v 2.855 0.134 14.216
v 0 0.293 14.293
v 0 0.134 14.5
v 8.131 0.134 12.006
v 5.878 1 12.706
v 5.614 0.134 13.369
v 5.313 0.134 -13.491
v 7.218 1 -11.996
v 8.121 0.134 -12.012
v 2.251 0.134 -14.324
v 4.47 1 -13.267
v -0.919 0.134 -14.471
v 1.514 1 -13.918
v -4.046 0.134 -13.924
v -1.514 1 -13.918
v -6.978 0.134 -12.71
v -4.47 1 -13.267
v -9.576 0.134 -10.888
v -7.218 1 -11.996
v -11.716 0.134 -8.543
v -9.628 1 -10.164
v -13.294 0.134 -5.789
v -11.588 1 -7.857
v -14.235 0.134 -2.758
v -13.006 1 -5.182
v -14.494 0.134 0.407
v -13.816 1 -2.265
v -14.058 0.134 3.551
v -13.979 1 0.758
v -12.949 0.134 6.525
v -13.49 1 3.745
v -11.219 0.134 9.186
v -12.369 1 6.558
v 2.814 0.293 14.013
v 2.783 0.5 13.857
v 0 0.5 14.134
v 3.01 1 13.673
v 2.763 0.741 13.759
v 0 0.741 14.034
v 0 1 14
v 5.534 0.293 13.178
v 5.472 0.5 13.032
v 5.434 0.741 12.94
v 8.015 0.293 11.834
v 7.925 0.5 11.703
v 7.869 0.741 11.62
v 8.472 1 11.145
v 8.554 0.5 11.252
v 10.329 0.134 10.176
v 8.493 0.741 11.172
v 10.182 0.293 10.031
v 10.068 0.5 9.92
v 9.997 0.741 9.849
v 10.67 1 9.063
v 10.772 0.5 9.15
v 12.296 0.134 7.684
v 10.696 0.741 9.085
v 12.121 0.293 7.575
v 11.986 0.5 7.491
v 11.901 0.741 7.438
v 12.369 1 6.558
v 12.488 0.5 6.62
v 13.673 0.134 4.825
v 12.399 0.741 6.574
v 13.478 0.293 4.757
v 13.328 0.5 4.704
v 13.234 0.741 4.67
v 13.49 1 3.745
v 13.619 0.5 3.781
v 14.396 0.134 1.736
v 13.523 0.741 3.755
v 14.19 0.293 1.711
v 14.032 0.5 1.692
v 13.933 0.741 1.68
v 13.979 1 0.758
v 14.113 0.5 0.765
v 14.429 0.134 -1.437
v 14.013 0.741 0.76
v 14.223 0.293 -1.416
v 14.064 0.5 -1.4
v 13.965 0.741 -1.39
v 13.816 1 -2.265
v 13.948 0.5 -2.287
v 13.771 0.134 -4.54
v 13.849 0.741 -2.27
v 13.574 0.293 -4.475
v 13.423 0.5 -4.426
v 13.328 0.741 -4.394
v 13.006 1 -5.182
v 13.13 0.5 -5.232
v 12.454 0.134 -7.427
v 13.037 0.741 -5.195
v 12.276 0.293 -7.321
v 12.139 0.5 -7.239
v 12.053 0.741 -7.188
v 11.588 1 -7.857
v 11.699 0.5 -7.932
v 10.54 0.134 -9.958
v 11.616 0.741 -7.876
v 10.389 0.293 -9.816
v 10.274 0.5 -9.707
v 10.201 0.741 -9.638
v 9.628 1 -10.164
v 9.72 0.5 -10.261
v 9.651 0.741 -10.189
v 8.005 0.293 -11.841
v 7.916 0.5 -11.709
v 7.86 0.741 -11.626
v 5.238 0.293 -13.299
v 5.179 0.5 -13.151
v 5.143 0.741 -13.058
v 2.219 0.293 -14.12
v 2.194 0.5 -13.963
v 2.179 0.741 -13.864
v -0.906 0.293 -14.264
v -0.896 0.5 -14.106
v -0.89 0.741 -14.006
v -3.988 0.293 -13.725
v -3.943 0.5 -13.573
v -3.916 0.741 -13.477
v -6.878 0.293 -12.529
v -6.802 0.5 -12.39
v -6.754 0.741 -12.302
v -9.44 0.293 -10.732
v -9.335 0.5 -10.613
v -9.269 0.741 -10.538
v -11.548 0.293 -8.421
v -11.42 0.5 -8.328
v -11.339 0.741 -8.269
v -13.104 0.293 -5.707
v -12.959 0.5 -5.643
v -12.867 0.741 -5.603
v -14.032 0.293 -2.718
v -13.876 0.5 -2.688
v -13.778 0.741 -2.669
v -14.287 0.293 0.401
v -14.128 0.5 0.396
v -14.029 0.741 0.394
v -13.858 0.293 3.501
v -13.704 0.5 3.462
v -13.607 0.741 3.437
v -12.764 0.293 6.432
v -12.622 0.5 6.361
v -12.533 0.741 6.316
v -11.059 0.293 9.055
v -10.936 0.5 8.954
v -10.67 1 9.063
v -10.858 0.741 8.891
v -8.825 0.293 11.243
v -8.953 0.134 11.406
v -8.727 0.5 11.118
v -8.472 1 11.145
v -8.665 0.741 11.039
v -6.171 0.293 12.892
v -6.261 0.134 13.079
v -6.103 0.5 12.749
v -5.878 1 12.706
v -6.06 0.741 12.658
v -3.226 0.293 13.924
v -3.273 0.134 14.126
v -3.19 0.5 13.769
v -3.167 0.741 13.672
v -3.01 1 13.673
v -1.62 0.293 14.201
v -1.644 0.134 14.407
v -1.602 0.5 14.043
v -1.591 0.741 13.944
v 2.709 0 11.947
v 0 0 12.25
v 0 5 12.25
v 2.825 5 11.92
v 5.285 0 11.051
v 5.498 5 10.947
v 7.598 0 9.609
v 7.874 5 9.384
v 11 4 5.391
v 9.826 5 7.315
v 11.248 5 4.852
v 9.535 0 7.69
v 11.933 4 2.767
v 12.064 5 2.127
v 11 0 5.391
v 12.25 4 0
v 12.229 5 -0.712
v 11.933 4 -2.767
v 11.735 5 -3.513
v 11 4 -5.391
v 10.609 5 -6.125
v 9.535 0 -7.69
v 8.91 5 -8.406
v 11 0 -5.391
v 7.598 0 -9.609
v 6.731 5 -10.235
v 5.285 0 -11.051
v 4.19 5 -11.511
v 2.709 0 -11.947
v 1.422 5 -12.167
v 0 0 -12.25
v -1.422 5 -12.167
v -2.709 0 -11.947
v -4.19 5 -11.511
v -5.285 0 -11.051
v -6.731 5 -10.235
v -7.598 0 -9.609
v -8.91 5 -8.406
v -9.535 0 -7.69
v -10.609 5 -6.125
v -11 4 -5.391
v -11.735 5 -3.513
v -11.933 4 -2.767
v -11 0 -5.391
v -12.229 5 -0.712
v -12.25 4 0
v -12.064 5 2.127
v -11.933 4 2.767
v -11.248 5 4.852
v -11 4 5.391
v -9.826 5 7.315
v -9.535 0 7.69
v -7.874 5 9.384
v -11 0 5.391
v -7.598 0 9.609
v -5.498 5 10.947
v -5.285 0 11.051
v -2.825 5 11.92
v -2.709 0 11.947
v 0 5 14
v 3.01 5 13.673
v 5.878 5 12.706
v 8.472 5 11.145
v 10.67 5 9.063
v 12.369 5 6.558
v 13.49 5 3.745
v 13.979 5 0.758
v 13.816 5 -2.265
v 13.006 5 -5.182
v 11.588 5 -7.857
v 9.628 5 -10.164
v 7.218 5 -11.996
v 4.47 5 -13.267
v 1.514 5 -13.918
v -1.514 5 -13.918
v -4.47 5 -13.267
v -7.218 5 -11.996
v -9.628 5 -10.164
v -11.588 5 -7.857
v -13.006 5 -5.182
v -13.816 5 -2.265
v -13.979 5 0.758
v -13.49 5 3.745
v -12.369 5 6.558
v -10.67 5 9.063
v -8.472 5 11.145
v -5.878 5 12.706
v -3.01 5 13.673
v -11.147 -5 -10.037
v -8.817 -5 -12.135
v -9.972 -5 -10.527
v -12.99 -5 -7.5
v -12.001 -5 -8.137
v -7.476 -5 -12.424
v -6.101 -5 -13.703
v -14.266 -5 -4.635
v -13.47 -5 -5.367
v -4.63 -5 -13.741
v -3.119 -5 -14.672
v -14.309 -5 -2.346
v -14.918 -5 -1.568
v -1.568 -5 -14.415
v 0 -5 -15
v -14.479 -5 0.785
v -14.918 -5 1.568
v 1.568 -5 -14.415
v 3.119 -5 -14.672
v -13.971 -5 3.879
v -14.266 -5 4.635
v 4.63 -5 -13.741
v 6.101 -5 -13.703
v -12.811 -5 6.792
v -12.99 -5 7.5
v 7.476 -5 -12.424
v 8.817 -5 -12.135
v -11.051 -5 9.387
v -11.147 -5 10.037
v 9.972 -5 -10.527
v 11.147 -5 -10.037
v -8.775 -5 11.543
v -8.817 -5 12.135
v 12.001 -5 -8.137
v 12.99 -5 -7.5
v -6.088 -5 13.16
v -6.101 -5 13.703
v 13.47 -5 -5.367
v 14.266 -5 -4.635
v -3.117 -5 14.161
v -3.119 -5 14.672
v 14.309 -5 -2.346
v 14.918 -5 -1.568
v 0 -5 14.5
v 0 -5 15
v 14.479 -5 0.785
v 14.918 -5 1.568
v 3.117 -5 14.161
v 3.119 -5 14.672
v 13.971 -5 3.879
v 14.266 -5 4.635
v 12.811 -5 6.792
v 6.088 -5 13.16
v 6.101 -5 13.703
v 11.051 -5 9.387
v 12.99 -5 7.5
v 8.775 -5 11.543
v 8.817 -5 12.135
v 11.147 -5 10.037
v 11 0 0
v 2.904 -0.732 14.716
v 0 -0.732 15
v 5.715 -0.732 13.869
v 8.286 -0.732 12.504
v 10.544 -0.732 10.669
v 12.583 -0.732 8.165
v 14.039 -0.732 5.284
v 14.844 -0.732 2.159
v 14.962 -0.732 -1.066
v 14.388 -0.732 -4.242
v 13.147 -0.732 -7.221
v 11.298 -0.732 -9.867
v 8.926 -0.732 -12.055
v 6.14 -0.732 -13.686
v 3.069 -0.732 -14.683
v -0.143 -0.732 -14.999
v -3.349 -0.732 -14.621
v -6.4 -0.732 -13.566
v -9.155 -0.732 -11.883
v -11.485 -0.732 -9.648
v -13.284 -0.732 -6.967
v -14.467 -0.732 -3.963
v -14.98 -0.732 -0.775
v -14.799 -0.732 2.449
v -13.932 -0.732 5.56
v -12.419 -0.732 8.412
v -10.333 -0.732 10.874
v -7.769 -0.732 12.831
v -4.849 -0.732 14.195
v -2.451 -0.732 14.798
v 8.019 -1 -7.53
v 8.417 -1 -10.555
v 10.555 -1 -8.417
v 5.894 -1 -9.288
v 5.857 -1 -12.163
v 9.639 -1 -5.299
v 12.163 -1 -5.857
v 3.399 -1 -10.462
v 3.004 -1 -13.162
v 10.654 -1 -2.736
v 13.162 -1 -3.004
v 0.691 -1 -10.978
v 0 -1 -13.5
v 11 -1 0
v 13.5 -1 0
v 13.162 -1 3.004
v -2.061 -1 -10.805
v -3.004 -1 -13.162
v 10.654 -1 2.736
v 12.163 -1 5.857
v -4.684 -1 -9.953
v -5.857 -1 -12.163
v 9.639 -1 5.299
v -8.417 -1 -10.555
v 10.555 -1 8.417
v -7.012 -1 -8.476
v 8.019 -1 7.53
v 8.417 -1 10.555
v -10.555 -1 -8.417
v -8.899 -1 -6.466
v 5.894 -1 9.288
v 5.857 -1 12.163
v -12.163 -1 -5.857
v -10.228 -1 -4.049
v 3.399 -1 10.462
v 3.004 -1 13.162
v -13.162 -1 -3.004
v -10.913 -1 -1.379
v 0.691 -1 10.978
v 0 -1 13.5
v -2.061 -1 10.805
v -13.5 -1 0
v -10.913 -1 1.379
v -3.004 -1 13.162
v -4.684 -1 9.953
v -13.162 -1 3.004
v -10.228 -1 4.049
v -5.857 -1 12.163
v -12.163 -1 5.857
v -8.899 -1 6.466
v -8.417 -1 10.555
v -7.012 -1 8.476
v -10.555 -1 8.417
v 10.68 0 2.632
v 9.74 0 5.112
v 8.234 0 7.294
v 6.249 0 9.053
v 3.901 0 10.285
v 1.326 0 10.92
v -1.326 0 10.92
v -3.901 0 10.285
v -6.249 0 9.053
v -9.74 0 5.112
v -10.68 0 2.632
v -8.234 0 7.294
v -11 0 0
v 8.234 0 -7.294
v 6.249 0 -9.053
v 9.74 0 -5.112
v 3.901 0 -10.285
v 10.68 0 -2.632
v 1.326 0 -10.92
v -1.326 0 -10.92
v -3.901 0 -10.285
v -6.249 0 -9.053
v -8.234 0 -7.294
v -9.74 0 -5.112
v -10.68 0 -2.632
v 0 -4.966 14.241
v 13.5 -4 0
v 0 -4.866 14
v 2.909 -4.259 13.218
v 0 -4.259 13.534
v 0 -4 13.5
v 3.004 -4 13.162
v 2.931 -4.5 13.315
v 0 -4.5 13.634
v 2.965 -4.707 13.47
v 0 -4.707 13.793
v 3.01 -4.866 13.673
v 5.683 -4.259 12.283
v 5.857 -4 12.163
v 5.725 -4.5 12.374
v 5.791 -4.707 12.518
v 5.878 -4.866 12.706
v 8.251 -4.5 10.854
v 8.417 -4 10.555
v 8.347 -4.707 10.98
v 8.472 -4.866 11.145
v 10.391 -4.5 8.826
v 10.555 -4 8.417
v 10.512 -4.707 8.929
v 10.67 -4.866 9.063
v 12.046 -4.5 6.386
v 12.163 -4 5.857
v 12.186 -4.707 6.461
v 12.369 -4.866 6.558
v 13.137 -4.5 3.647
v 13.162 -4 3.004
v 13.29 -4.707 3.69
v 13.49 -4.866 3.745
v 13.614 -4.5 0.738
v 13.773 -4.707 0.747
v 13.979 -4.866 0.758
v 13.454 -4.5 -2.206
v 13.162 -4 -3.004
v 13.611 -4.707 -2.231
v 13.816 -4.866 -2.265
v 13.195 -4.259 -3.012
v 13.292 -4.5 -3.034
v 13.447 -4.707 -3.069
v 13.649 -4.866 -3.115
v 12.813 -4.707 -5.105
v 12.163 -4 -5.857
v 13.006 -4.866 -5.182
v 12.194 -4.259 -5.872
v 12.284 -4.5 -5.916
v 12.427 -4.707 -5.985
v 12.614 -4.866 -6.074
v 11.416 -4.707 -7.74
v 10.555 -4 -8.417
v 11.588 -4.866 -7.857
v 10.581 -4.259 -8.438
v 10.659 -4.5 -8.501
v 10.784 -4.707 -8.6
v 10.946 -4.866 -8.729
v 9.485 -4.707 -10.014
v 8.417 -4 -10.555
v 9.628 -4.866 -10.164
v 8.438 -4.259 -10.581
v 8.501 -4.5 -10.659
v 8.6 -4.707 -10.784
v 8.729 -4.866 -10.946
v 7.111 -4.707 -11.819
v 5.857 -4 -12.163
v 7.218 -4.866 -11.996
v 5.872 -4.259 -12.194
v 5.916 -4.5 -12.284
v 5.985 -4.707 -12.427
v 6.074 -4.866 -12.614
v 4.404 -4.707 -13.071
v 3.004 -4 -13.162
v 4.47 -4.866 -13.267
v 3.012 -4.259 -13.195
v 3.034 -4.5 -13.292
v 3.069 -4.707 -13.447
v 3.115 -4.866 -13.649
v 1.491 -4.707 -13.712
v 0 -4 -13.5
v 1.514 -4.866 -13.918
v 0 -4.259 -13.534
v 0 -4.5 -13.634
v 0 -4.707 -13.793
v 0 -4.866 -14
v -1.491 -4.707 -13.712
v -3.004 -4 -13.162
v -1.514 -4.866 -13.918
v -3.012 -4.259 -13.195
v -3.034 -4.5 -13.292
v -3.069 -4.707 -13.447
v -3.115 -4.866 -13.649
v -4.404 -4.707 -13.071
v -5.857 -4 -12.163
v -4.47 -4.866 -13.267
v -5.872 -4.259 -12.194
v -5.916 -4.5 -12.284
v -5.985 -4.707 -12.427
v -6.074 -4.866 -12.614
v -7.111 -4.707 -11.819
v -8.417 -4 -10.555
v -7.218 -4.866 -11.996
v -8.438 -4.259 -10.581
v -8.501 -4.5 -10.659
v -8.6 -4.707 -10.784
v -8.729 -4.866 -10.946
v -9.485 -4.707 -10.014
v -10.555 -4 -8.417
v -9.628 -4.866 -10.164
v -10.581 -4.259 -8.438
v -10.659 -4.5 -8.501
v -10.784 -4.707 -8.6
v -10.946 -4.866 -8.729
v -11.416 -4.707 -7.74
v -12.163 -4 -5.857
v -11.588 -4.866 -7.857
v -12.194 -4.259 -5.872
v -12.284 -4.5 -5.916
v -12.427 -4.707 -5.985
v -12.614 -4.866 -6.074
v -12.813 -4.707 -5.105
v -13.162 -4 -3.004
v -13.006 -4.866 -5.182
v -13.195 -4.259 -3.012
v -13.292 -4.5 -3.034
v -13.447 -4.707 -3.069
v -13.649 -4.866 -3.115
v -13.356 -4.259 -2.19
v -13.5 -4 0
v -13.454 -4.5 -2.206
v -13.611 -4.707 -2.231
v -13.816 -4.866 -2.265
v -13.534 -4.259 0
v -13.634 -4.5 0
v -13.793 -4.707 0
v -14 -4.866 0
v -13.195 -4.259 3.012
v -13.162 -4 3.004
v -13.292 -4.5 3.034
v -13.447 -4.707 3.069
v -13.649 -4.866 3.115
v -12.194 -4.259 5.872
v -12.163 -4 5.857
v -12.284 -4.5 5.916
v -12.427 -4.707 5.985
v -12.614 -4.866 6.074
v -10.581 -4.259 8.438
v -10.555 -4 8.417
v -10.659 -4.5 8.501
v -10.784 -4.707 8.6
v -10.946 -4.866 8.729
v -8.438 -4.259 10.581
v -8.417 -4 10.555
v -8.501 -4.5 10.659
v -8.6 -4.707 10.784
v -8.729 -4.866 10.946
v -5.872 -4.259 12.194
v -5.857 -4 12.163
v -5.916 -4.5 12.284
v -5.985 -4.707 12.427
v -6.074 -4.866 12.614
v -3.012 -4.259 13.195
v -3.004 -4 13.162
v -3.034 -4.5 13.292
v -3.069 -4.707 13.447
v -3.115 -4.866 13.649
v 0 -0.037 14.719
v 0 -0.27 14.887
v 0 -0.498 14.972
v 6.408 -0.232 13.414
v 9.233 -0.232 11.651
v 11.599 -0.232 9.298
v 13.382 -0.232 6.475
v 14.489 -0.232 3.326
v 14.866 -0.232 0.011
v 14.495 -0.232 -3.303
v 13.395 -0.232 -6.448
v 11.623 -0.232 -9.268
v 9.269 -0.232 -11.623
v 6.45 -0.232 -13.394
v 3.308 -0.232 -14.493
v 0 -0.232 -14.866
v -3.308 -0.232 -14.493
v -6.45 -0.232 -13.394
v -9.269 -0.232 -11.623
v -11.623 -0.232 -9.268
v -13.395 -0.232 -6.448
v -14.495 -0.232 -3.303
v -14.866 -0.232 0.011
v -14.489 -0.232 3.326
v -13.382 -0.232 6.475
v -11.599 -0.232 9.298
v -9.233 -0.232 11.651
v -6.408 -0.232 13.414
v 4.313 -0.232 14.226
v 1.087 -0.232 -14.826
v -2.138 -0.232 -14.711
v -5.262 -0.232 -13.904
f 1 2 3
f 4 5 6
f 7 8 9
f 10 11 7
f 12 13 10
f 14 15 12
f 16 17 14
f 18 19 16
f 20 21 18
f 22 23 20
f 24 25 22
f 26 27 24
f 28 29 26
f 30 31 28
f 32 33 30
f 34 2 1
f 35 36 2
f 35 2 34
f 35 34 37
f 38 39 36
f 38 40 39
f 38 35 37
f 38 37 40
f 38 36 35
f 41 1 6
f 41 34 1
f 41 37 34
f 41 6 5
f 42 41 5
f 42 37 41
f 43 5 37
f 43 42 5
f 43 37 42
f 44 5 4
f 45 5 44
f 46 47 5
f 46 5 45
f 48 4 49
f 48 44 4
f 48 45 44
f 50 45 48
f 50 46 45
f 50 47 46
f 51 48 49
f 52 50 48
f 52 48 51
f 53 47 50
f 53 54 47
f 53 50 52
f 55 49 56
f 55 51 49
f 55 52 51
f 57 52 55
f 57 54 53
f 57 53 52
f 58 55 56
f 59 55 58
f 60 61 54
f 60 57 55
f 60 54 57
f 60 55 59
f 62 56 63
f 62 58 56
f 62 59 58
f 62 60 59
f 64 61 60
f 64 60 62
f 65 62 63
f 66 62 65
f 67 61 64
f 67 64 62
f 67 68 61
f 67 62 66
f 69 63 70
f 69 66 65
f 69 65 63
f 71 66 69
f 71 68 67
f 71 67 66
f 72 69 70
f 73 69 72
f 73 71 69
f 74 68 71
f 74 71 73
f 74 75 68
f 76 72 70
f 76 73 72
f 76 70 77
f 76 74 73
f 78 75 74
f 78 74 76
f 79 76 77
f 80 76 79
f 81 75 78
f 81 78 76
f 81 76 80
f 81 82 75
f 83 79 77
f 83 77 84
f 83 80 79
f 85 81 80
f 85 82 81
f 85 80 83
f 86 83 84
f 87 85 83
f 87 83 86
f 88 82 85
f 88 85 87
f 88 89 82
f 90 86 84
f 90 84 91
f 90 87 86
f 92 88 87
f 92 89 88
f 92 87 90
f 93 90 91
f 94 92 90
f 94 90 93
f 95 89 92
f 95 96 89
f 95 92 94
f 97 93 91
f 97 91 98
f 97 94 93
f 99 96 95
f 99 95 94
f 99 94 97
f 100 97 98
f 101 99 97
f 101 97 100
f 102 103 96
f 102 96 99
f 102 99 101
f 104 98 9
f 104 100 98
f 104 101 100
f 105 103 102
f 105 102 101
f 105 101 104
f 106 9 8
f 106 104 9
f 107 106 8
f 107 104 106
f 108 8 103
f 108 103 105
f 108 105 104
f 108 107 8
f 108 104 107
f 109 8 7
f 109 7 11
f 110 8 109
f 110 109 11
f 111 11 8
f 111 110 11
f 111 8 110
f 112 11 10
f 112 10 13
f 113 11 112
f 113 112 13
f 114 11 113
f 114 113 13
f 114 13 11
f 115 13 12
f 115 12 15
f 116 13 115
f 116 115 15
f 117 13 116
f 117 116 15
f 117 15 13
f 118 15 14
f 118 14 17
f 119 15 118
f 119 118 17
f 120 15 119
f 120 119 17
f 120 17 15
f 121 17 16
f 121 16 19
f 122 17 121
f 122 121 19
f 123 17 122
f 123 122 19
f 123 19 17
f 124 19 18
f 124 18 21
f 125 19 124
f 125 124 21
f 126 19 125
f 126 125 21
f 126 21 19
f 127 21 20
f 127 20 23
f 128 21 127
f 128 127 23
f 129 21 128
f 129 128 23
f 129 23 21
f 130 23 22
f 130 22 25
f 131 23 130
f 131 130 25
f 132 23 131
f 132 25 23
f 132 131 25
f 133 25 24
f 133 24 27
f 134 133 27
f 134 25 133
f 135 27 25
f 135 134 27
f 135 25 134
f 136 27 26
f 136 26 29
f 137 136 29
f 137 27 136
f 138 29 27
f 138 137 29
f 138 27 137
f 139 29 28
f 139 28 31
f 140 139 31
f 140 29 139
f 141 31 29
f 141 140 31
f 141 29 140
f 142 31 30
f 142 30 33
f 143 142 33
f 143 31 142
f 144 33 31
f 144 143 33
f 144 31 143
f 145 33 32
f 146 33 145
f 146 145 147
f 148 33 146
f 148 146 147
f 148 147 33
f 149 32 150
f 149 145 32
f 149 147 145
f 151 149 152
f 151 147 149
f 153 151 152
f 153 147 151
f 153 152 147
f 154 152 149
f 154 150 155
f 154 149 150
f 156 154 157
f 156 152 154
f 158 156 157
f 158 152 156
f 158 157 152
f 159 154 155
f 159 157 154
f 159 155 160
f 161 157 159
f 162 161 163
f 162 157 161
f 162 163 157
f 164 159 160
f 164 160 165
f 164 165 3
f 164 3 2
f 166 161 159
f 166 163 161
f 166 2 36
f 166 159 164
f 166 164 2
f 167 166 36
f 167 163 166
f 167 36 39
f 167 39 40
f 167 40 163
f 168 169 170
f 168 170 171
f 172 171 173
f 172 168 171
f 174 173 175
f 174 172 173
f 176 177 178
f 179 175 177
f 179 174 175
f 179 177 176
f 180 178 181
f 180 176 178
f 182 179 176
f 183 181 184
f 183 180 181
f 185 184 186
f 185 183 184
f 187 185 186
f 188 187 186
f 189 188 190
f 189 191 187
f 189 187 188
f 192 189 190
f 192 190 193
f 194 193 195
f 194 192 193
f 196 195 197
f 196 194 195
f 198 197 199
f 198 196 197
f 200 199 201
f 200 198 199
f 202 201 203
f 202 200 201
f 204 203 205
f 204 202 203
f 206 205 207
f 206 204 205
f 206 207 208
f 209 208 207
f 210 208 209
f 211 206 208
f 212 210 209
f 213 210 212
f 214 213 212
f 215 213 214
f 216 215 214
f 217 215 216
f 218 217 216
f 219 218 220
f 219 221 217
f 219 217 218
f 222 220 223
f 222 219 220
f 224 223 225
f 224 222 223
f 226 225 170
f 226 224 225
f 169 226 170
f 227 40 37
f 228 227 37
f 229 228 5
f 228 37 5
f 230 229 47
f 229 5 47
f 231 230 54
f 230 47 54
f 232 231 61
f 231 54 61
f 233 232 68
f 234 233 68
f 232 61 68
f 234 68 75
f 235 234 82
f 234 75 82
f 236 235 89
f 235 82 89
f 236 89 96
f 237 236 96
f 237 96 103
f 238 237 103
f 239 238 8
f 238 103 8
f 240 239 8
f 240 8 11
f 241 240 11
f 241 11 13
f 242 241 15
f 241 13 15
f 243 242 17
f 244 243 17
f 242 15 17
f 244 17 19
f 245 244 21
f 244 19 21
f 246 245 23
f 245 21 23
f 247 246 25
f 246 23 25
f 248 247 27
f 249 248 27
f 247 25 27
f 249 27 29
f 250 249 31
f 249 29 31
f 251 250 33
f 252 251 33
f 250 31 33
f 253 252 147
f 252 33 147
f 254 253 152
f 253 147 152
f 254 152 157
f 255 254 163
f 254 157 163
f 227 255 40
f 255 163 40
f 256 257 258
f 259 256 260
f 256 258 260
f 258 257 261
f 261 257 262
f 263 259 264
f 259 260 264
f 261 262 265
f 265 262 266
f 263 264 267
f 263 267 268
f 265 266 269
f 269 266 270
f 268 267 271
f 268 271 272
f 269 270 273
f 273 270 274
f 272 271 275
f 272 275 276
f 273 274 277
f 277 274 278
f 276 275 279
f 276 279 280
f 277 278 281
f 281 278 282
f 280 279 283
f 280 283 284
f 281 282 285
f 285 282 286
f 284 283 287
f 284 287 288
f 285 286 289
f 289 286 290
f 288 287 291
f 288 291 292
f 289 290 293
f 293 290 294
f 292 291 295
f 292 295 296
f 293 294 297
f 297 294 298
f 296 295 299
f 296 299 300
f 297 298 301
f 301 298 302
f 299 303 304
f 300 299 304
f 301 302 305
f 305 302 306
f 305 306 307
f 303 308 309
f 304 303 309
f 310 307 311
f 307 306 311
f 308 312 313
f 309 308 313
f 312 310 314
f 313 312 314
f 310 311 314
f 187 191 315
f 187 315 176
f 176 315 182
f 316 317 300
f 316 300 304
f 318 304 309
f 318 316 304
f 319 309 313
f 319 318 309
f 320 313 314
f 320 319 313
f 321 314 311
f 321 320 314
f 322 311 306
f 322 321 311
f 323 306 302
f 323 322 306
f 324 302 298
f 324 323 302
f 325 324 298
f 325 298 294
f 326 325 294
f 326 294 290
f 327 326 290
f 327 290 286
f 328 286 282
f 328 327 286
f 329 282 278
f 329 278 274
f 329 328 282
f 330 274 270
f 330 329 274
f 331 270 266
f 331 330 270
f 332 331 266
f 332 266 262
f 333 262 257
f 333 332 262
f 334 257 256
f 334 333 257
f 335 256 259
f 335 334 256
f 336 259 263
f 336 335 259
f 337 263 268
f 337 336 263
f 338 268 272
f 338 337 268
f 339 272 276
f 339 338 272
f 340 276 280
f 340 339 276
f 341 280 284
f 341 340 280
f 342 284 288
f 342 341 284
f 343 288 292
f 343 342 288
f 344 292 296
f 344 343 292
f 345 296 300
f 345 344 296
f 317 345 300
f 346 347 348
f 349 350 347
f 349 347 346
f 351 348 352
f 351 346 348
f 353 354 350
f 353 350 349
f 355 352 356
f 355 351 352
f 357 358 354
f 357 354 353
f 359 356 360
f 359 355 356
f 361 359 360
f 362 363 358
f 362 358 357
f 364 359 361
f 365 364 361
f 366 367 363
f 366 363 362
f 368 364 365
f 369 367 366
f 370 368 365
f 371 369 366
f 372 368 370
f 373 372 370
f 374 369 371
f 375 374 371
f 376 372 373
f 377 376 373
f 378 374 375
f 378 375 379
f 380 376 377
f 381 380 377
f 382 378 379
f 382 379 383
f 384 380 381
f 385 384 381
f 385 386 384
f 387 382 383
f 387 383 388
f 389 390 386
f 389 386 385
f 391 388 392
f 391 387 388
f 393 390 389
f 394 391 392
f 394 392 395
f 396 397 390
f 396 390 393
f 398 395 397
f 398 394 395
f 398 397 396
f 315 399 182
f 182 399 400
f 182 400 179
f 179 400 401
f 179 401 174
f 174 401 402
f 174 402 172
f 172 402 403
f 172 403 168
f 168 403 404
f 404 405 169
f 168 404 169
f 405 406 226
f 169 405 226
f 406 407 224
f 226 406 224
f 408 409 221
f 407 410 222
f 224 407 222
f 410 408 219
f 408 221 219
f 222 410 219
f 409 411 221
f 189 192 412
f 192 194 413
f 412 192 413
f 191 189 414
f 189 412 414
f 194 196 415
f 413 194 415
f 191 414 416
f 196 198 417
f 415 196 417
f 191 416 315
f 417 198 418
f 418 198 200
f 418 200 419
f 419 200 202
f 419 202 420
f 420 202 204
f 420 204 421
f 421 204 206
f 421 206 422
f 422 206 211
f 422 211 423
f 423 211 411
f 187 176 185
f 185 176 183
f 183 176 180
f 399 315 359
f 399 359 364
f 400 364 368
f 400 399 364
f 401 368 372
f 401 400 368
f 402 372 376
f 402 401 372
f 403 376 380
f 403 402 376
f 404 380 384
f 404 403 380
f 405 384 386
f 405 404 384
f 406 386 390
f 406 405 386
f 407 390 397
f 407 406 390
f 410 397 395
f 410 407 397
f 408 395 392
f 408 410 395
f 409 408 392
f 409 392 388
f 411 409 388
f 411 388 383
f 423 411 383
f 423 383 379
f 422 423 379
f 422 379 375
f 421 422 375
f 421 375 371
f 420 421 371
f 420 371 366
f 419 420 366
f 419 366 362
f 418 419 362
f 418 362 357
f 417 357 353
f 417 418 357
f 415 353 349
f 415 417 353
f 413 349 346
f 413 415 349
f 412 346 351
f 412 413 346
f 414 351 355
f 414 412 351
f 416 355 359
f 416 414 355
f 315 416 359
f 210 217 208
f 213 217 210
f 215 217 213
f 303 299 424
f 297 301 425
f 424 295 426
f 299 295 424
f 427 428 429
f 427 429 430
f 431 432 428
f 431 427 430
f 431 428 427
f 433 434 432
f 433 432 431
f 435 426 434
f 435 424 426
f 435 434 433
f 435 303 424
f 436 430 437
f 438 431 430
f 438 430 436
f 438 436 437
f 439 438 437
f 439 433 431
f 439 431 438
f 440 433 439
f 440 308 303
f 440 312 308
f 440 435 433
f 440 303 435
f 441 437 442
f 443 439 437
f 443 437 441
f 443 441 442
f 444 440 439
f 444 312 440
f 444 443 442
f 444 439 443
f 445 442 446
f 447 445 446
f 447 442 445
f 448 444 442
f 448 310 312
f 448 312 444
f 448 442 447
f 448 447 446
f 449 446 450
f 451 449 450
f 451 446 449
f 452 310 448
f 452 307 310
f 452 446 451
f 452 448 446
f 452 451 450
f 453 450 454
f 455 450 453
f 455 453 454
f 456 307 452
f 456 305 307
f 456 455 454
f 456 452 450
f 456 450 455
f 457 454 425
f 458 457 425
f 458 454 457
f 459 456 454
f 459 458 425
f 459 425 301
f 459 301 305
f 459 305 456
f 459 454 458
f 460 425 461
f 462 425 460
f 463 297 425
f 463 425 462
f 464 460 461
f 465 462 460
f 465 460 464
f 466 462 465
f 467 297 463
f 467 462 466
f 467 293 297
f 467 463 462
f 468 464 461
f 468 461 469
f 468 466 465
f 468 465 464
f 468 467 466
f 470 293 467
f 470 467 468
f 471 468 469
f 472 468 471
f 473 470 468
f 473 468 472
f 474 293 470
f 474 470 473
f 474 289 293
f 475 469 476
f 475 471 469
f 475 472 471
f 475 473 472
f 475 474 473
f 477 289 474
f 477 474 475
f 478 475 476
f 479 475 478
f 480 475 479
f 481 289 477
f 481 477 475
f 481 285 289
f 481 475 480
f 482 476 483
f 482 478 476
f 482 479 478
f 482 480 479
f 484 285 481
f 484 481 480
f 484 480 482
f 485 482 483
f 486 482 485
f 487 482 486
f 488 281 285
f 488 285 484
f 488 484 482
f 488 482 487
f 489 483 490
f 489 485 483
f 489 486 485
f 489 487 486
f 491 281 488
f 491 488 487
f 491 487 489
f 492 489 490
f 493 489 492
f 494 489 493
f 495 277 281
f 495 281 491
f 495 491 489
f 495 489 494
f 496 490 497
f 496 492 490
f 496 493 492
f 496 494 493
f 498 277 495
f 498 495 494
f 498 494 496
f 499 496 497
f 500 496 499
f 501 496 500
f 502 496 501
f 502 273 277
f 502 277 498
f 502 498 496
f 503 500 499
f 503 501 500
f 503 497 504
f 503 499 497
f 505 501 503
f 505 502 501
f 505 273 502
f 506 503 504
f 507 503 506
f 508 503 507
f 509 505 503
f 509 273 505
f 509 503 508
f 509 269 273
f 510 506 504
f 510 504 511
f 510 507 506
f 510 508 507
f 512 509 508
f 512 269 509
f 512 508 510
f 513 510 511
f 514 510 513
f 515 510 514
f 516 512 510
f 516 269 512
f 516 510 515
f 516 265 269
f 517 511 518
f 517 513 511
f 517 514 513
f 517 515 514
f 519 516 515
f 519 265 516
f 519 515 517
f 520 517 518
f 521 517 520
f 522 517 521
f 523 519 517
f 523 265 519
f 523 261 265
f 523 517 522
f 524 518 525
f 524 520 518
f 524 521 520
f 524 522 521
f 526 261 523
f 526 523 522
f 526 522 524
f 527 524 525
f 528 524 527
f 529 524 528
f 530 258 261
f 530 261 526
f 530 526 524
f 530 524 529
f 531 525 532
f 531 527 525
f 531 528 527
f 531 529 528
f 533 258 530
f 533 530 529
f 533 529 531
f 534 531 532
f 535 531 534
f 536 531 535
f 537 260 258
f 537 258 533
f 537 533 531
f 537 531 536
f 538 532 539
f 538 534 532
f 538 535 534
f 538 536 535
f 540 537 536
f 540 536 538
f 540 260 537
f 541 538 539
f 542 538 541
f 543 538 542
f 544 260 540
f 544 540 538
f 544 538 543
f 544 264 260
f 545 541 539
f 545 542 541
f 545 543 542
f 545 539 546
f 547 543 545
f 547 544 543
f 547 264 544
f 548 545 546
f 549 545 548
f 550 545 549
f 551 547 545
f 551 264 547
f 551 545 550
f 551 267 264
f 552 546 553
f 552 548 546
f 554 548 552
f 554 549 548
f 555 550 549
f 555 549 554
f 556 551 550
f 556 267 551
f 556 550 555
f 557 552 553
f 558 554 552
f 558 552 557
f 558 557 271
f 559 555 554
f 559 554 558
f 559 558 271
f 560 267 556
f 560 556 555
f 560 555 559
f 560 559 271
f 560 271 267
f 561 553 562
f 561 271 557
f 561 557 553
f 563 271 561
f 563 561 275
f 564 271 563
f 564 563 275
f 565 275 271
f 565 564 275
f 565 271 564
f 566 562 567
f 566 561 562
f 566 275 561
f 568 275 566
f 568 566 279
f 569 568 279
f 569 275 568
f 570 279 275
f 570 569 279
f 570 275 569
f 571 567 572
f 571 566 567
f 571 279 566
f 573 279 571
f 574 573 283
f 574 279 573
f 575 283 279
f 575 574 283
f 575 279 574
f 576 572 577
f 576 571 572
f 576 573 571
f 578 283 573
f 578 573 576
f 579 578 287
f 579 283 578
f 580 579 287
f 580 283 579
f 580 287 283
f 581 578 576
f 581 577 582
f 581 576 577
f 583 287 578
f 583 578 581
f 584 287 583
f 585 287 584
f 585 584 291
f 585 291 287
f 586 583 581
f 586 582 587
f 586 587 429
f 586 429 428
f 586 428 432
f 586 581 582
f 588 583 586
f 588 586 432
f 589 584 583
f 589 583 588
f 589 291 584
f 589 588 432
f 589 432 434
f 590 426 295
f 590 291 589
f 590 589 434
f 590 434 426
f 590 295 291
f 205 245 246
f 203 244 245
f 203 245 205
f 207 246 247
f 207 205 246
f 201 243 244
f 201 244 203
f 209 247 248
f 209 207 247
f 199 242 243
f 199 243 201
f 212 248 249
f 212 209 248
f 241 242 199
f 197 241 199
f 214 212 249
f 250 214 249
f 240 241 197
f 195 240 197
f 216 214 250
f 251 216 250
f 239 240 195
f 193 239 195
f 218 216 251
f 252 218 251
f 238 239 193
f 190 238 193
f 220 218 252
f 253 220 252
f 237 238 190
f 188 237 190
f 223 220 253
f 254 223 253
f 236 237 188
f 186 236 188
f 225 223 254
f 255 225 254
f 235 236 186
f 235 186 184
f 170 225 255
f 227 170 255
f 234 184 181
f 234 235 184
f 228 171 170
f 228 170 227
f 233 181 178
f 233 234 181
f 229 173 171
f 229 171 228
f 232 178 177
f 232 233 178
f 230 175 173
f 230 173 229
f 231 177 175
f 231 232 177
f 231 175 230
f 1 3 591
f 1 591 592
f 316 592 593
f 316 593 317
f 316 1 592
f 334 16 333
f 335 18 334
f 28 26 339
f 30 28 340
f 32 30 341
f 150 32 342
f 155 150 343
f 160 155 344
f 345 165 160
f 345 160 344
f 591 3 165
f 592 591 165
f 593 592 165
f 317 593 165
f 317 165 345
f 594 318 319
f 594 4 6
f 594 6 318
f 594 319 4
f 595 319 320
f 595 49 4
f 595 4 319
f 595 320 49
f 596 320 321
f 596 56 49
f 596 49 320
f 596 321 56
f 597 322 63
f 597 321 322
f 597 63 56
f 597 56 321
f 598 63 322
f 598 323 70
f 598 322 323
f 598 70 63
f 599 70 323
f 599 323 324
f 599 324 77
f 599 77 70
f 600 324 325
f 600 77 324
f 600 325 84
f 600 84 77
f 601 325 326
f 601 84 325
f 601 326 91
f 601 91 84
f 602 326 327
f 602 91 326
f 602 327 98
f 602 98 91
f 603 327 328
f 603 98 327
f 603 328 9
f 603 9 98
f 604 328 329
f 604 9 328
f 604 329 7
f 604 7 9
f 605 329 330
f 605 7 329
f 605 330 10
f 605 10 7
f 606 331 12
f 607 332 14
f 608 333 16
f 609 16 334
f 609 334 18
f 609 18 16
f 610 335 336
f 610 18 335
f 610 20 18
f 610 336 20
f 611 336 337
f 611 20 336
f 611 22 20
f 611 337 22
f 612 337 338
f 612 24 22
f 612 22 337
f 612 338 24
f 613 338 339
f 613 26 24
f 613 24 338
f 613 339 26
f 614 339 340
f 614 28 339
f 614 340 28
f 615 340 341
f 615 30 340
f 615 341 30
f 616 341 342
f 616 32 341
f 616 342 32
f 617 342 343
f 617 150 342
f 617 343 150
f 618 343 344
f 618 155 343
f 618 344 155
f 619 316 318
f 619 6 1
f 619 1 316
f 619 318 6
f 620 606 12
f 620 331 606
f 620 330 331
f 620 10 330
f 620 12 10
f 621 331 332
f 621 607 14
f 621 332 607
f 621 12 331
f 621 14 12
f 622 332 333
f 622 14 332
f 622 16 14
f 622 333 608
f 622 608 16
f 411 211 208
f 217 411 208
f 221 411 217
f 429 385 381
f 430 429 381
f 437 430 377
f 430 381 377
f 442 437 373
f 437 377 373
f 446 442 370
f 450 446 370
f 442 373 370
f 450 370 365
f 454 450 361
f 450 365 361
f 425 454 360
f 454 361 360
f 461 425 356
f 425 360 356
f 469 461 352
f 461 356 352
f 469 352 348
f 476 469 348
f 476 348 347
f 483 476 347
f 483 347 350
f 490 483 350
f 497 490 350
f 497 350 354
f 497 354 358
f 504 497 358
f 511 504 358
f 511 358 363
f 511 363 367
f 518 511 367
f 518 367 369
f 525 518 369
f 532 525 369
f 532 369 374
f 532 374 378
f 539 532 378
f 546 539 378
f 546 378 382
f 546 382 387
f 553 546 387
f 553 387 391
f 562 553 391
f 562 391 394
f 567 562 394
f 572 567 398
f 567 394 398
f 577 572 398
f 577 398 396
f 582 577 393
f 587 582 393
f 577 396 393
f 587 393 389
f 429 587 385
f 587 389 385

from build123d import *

# Parameters (mm, degrees)
SKETCH_1_R      = 14
SKETCH_1_R_2    = 12.25
EXTRUDE_1_DEPTH = 5
EXTRUDE_2_DEPTH = 4
SKETCH_3_R      = 15
SKETCH_3_R_2    = 13.5
EXTRUDE_3_DEPTH = 5
FILLET_2_R      = 1
FILLET_3_R      = 1
SKETCH_4_R      = 13.5
SKETCH_4_R_2    = 11
EXTRUDE_4_DEPTH = 1
FILLET_5_R      = 1


with BuildPart() as part:
    # 草图1 → 凸台-拉伸1 (new body)
    with BuildSketch(Plane(origin=(0, 0, 0), x_dir=(1, 0, 0), z_dir=(0, 1, 0))):
        with Locations(Location((0, 0, 0), (0, 0, 270))):
            Circle(SKETCH_1_R)
        with Locations(Location((0, 0, 0), (0, 0, 270))):
            Circle(SKETCH_1_R_2, mode=Mode.SUBTRACT)
    extrude(amount=EXTRUDE_1_DEPTH)

    # 草图2 → 凸台-拉伸2 (add)
    with BuildSketch(Plane(origin=(0, 0, 0), x_dir=(1, 0, 0), z_dir=(0, 1, 0))):
        with BuildLine():
            Line((-11, 5.390964663), (-11, -5.390964663))
            ThreePointArc((-11, -5.390964663), (-12.25, 0), (-11, 5.390964663))
        make_face()
        with BuildLine():
            Line((11, 5.390964663), (11, -5.390964663))
            ThreePointArc((11, -5.390964663), (12.25, 0), (11, 5.390964663))
        make_face()
    extrude(amount=EXTRUDE_2_DEPTH)

    # 草图3 → 凸台-拉伸3 (add)
    with BuildSketch(Plane(origin=(0, 0, 0), x_dir=(1, 0, 0), z_dir=(0, 1, 0))):
        with Locations(Location((0, 0, 0), (0, 0, 270))):
            Circle(SKETCH_3_R)
        with Locations(Location((0, 0, 0), (0, 0, 270))):
            Circle(SKETCH_3_R_2, mode=Mode.SUBTRACT)
    extrude(amount=-EXTRUDE_3_DEPTH)

    # 圆角2
    fillet_2_edges = [part.edges().sort_by_distance(p)[0] for p in [
        (0, 0, -14),
    ]]
    fillet(fillet_2_edges, radius=FILLET_2_R - 0.0001)  # a hair under: the kernel refuses the full size

    # 圆角3
    fillet_3_edges = [part.edges().sort_by_distance(p)[0] for p in [
        (0, 0, -15),
    ]]
    fillet(fillet_3_edges, radius=FILLET_3_R)

    # 草图4 → 凸台-拉伸4 (add)
    with BuildSketch(Plane.XZ):
        with Locations(Location((0, 0, 0), (0, 0, 90))):
            Circle(SKETCH_4_R)
        Circle(SKETCH_4_R_2, mode=Mode.SUBTRACT)
    extrude(amount=EXTRUDE_4_DEPTH)

    # 圆角5
    fillet_5_edges = [part.edges().sort_by_distance(p)[0] for p in [
        (0, -5, -13.5),
    ]]
    fillet(fillet_5_edges, radius=FILLET_5_R)


solid = part.part
